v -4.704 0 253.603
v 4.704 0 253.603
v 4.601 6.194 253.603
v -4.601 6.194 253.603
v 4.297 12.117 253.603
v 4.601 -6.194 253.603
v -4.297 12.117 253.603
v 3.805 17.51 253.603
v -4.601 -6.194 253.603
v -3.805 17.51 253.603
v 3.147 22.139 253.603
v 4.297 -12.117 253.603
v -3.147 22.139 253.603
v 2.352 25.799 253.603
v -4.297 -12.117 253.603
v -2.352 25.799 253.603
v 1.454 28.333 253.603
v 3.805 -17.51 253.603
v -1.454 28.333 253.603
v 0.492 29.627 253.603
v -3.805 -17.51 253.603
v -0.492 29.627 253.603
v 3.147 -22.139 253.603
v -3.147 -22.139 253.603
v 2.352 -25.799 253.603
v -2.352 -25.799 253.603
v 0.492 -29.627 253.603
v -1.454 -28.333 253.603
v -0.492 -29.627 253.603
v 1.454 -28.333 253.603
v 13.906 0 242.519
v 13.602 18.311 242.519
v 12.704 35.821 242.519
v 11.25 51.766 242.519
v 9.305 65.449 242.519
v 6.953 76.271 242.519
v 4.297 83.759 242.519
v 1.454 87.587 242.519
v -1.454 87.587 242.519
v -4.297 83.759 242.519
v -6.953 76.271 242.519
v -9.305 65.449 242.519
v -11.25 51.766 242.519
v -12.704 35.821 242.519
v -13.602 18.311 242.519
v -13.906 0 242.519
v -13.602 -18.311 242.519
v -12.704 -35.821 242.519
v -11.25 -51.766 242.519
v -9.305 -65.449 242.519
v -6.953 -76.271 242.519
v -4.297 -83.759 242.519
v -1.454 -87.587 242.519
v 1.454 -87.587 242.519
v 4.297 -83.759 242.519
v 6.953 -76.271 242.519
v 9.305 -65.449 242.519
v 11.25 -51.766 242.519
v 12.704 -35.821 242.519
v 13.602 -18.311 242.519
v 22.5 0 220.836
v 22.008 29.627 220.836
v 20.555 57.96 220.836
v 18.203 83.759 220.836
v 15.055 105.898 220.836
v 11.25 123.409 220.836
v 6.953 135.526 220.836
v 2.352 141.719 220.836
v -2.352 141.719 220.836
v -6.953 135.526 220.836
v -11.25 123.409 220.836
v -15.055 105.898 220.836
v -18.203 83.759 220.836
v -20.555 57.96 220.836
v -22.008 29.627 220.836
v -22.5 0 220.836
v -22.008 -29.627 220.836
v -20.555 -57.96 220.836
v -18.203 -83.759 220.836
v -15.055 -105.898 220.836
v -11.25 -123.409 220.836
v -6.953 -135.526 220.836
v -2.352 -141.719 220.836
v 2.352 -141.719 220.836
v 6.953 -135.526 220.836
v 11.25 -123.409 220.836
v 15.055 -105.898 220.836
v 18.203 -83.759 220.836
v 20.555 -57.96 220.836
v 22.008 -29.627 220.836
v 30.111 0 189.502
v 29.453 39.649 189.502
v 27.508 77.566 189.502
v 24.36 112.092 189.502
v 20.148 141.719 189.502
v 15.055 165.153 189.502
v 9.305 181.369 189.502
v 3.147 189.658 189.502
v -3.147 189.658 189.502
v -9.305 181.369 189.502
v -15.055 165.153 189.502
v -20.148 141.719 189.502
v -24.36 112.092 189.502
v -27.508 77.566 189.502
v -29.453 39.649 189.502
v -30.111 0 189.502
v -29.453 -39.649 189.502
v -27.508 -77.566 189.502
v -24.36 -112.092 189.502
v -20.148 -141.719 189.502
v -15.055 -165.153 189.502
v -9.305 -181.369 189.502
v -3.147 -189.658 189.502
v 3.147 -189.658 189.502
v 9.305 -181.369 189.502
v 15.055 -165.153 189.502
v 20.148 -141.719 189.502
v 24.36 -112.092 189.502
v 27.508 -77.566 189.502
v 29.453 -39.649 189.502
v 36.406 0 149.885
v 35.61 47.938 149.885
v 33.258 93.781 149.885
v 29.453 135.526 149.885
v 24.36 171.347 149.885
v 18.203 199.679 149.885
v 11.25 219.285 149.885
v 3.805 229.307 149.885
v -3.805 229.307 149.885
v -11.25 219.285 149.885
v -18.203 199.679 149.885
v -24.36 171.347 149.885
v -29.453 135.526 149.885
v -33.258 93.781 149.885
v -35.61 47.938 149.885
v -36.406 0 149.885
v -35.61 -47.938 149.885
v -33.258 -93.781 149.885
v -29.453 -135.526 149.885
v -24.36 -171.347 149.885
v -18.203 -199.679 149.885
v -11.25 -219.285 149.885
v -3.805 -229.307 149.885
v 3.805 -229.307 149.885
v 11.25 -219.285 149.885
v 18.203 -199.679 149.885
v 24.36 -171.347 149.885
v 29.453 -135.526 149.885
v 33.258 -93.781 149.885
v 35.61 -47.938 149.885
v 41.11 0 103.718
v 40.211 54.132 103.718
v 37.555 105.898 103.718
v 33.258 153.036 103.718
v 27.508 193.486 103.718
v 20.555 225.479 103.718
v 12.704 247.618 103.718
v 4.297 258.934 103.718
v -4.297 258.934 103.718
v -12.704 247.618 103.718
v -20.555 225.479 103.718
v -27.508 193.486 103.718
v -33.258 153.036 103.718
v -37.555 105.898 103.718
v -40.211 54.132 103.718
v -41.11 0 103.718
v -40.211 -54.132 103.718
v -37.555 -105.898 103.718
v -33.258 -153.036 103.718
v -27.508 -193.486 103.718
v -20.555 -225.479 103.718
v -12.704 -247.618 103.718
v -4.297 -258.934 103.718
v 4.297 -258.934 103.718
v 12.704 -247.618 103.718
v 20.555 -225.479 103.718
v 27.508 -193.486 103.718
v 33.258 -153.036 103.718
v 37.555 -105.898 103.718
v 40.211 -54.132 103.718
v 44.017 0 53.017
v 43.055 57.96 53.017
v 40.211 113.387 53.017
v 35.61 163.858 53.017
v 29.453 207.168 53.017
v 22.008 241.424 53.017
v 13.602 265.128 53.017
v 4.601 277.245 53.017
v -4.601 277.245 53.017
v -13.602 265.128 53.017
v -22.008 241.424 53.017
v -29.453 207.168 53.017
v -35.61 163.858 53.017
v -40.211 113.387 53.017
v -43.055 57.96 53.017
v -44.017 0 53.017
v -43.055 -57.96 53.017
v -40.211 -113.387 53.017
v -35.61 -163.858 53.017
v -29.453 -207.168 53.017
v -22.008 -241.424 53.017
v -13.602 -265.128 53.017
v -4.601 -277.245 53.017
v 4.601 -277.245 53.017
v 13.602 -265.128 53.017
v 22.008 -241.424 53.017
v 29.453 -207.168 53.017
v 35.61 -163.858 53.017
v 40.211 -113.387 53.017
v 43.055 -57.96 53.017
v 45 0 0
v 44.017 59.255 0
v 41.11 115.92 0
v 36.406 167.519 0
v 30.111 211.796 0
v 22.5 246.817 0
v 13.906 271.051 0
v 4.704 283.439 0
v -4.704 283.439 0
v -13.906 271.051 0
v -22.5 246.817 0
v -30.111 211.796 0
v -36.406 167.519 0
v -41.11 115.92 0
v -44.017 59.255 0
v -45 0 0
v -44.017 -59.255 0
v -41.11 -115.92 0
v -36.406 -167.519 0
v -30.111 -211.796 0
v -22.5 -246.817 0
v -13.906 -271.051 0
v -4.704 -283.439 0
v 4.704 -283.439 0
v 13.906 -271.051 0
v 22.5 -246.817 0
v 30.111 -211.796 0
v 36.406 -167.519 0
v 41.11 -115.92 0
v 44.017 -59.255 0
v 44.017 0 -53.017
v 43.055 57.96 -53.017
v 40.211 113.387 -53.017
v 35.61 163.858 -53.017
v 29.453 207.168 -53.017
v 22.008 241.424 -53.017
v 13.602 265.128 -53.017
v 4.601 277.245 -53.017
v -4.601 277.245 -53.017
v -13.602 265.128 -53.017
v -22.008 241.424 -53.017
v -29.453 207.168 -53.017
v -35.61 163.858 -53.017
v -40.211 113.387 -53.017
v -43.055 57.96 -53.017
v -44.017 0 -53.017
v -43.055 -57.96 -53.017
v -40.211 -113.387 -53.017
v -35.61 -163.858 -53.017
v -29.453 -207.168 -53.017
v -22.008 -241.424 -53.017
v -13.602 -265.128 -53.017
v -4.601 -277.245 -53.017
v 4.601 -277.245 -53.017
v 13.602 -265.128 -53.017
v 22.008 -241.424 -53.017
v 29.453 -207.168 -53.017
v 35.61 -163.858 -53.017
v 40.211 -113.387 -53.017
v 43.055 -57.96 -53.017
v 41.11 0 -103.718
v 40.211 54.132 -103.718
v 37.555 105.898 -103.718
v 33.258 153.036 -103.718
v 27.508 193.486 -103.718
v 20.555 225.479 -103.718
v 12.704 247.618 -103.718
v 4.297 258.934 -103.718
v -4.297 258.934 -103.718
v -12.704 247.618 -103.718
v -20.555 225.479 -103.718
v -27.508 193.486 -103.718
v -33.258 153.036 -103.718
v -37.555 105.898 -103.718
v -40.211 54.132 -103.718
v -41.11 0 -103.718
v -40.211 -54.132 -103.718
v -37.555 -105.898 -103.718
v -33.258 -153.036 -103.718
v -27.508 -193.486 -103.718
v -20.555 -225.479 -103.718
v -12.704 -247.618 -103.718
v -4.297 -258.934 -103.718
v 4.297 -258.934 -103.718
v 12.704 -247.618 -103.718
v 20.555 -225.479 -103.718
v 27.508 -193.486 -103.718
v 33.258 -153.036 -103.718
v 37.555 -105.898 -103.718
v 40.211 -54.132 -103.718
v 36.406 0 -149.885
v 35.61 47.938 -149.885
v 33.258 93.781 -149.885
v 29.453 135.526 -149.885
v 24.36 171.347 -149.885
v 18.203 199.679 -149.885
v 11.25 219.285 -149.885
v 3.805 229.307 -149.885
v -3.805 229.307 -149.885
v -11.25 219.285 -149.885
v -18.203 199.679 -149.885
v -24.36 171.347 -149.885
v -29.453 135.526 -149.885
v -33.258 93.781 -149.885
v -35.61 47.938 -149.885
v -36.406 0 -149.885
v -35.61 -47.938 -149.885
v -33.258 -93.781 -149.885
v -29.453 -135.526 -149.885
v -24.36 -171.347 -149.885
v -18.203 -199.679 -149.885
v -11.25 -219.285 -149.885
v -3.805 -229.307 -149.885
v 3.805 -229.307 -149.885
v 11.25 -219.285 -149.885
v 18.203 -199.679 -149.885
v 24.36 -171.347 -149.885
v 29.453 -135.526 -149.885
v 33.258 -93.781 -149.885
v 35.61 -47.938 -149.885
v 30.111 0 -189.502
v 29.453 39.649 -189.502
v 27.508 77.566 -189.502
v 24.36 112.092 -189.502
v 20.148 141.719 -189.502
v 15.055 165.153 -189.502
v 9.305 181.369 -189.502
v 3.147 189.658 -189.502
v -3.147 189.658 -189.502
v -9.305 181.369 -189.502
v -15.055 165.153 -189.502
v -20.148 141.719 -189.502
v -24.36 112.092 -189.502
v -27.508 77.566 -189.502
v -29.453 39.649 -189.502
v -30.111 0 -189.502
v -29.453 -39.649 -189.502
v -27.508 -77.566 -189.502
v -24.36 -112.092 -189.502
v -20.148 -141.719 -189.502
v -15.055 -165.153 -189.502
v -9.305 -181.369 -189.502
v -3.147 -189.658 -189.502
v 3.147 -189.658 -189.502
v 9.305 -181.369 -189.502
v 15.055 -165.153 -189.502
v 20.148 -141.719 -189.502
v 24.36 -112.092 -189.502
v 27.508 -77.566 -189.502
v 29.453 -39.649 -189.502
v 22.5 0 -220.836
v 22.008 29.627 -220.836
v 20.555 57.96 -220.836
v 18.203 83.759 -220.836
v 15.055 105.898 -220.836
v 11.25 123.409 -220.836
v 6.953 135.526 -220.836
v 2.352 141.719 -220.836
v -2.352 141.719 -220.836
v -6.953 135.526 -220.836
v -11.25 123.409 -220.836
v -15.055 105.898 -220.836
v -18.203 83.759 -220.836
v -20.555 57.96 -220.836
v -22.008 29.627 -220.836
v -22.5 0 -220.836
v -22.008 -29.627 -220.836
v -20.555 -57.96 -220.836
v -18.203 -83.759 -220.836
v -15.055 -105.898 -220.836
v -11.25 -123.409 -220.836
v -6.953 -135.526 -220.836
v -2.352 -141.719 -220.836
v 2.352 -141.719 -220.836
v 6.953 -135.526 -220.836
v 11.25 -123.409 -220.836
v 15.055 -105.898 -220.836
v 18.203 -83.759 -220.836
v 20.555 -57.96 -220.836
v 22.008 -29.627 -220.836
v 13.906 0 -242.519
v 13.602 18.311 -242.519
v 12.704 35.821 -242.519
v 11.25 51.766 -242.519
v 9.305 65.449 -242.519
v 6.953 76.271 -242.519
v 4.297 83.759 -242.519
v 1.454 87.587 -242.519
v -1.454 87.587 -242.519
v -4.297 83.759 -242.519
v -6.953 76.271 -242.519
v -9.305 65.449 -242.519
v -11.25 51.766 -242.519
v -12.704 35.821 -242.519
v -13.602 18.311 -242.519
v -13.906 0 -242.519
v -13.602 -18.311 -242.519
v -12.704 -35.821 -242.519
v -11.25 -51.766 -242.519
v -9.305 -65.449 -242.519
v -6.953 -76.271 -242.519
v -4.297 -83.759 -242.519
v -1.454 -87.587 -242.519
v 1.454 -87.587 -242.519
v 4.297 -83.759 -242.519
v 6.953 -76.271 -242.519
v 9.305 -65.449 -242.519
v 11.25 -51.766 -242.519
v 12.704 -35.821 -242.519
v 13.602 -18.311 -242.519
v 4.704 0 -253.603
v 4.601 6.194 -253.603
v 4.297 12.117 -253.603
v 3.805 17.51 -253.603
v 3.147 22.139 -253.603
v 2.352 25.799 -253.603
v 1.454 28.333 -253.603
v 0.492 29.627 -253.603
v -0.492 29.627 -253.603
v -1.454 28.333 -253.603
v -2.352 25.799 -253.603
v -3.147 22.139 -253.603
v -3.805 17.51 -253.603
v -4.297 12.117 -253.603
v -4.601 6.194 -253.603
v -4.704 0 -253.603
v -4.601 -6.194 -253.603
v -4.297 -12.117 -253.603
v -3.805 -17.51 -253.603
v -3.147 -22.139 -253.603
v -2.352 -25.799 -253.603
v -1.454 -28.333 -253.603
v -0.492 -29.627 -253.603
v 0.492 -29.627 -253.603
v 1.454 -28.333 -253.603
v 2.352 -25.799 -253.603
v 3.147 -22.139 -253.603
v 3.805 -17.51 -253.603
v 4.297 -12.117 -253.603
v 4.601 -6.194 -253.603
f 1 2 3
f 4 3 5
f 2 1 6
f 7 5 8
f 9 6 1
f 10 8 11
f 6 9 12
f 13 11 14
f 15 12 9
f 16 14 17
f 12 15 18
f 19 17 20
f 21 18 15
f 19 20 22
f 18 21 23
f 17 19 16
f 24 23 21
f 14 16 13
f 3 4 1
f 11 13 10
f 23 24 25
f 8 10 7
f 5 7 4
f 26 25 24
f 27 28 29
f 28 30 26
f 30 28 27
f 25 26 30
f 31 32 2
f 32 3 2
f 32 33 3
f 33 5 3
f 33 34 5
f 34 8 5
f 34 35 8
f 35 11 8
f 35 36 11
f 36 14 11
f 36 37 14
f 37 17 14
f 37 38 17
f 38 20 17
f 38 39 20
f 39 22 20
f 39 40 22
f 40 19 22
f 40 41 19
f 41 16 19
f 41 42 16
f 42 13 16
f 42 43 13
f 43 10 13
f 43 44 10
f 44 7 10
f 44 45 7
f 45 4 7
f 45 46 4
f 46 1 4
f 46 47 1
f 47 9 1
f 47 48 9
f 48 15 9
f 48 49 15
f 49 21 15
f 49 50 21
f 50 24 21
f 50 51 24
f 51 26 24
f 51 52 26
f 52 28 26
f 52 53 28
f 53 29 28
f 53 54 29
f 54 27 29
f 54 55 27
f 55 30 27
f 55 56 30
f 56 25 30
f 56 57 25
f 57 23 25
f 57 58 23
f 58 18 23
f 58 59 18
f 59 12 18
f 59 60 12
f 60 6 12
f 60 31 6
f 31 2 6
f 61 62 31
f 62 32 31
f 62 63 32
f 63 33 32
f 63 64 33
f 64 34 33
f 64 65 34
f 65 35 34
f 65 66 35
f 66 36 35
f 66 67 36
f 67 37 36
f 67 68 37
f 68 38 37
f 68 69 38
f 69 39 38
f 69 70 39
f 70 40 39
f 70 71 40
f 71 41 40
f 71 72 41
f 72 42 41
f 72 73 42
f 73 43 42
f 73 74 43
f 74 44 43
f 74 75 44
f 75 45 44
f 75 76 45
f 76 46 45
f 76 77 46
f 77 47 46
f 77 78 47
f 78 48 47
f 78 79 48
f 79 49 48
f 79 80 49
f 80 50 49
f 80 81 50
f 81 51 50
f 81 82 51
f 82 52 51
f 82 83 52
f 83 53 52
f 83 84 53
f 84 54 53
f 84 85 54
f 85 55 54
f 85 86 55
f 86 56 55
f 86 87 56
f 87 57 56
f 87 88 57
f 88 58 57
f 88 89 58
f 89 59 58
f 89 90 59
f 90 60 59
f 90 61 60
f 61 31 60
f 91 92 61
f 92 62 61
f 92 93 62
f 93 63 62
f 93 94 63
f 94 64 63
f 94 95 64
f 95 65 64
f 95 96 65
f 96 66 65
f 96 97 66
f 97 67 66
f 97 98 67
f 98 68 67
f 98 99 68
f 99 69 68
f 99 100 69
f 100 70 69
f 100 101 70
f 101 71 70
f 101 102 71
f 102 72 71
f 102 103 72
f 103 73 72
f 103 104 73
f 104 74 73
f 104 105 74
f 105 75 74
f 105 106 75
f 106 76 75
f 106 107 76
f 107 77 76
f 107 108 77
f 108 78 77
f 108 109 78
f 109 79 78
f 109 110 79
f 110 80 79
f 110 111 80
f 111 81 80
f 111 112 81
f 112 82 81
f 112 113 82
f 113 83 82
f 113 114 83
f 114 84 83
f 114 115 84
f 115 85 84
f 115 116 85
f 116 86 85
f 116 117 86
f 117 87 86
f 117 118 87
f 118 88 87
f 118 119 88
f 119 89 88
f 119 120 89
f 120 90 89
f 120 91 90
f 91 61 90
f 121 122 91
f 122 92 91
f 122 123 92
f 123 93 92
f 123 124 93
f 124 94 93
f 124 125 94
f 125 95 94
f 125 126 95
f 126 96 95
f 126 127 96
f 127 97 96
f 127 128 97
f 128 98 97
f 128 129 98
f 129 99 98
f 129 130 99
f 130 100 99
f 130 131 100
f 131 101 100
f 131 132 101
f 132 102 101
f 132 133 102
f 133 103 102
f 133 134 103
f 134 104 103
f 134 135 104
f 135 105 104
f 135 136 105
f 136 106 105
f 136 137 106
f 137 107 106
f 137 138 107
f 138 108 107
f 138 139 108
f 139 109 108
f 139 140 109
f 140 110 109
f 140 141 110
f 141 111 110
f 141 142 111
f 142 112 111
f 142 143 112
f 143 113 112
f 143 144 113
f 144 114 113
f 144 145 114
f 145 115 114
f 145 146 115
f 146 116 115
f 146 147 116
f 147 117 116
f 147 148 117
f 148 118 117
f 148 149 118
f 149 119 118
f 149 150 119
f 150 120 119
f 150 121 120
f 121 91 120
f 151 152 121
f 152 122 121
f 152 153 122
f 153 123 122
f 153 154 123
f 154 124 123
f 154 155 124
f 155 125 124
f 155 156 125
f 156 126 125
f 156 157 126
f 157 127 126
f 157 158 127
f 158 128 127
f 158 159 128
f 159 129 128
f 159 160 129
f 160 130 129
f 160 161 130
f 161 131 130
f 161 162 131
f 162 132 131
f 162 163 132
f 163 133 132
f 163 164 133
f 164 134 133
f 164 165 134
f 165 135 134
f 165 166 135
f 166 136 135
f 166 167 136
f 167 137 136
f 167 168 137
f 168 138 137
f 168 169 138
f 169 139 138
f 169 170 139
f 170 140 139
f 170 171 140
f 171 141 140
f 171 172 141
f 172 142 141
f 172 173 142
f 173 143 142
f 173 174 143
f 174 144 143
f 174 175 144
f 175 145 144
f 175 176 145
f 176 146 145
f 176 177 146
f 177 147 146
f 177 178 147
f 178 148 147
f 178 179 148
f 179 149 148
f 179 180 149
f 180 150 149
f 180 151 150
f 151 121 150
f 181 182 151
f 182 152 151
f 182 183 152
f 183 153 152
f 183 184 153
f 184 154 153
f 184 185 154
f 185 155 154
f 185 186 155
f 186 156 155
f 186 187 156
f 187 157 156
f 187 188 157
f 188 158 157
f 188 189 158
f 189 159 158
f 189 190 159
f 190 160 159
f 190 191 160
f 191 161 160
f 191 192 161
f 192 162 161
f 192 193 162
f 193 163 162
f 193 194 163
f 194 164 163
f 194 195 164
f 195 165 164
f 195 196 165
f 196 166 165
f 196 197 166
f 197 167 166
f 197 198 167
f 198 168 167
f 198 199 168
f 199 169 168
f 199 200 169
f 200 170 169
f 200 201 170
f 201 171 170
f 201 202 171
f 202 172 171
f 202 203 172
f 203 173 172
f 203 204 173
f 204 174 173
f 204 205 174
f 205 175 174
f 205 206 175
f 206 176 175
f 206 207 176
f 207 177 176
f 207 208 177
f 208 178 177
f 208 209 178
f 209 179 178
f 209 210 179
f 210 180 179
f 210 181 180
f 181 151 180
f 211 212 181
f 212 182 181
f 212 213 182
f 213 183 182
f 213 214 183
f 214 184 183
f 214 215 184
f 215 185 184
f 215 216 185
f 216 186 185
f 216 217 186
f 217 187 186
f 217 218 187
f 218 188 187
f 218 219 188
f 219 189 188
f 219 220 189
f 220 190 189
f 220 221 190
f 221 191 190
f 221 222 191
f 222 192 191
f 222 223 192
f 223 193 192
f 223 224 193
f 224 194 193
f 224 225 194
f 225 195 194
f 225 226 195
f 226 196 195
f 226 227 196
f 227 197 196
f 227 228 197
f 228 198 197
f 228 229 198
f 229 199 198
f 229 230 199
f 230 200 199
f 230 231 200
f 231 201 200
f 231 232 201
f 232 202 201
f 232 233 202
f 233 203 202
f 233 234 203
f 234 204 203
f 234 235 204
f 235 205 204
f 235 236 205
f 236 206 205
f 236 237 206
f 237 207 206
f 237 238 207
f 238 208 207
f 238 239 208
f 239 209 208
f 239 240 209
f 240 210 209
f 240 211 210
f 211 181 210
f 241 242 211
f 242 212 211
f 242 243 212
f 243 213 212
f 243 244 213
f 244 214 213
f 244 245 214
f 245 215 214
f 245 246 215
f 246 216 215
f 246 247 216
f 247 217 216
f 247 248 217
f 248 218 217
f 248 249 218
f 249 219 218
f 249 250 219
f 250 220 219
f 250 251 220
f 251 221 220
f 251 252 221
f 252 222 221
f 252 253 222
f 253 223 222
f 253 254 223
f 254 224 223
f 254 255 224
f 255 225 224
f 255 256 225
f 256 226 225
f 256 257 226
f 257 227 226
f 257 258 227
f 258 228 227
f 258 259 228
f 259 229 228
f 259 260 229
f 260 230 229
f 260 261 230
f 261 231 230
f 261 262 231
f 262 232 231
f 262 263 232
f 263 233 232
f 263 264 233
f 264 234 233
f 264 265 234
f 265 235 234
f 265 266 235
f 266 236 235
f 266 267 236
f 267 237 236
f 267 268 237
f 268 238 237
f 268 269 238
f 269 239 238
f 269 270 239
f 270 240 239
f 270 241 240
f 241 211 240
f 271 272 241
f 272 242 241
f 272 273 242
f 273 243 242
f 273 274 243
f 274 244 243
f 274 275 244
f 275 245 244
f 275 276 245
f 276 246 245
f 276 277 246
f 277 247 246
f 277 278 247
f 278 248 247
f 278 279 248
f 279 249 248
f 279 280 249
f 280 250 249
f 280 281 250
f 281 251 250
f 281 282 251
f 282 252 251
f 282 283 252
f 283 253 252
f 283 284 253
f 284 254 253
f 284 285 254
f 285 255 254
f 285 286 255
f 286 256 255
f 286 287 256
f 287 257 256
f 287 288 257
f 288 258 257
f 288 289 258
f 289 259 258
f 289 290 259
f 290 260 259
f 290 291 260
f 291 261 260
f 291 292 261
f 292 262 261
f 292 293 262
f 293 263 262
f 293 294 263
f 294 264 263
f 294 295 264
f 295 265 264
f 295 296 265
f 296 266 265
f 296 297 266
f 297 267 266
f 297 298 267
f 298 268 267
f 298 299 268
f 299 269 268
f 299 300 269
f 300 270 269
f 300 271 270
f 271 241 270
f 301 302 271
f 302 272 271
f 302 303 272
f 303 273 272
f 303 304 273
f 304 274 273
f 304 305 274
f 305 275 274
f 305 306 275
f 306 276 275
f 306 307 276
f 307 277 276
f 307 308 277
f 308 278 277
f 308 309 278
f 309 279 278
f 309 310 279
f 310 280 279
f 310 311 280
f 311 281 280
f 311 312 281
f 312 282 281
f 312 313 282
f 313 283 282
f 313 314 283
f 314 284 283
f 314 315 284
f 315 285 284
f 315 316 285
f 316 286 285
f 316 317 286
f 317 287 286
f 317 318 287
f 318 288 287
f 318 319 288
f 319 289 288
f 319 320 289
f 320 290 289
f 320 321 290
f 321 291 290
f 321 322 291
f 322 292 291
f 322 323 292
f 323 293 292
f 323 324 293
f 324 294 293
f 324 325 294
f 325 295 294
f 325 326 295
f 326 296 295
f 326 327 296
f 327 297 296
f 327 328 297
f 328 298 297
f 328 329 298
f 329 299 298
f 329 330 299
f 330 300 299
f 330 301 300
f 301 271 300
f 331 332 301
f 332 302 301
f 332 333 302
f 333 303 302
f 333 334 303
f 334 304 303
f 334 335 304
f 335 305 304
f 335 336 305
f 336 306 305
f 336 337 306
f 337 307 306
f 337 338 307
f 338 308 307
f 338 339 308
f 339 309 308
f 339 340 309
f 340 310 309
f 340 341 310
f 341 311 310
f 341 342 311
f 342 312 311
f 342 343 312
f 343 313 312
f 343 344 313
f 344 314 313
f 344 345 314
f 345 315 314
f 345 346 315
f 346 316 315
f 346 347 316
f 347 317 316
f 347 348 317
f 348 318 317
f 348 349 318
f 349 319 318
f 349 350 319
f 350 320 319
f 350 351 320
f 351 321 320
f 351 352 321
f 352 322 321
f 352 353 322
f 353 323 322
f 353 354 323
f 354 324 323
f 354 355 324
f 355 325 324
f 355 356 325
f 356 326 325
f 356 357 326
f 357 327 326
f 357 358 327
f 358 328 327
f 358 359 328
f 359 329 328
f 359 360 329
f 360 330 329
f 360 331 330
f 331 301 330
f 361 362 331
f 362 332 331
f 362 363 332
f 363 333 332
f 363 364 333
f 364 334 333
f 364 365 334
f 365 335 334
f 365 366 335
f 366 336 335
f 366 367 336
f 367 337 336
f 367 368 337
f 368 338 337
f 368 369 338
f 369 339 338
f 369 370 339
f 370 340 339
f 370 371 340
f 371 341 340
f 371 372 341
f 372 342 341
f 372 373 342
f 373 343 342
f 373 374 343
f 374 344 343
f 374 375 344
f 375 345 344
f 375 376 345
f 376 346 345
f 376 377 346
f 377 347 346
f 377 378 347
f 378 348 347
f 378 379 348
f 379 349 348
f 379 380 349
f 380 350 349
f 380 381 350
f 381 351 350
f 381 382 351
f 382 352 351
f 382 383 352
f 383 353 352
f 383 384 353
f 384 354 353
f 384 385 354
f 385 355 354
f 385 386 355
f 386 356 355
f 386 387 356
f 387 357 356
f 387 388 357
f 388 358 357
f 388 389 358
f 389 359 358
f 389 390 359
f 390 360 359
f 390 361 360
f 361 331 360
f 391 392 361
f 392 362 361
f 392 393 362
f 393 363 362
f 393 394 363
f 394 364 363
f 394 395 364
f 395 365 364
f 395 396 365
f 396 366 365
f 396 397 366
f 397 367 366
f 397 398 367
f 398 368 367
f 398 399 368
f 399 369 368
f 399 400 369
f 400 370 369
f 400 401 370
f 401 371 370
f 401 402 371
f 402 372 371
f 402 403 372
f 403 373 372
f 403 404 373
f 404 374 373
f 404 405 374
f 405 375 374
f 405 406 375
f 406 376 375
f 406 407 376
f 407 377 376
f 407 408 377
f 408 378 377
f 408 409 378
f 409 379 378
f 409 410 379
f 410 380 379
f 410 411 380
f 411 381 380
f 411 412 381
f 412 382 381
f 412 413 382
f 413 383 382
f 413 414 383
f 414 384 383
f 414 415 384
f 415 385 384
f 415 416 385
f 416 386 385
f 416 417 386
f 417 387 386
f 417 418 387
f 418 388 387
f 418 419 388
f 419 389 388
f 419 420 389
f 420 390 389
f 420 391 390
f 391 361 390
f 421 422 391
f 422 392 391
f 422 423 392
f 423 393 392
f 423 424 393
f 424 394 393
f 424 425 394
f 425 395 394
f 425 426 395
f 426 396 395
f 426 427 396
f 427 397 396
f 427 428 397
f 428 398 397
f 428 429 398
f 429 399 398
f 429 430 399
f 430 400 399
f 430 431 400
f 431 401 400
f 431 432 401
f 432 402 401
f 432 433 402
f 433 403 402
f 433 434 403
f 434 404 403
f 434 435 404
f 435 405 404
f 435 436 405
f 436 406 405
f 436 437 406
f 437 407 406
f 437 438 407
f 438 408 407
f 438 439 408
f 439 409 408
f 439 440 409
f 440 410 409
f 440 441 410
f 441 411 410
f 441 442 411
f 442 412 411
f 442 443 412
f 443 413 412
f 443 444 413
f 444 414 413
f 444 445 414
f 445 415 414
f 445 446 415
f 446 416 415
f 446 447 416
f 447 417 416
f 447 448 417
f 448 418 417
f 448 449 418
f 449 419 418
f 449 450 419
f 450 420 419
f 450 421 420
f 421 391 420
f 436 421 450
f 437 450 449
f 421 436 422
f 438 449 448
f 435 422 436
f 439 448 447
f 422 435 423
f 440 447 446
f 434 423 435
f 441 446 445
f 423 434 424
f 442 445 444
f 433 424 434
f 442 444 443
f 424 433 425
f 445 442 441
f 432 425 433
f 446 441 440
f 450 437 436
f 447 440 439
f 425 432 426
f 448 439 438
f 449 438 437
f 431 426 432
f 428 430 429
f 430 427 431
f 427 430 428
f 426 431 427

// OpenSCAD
// Generated by SolidPython 1.0.1 on 2020-07-29 00:46:46


scale(v = [3, 19, 17]) {
	sphere(r = 15);
}
/***********************************************
*********      SolidPython code:      **********
************************************************
 
# import packages: SolidPython
from solid import *
from solid.utils import *
from itertools import chain, combinations, permutations


class Resize:

    def __init__(self, scad_file):
        self.scad_file = scad_file
        #self.scad_file = import_scad(scad_file)
        # cone/cylinder param:
        self.r1 = 0
        self.r2 = 0
        self.h = 0
        # rectangular prism param:
        self.w = 0
        self.l = 0
        # ellipse param:
        self.r = 0

    # import OpenScad code (file name corresponds to shape)


    # classify shape + parameters
    def assign(self, param1, param2, param3):
        if self.scad_file == 'cone.scad':
            self.r1 = param1
            self.r2 = param2
            self.h = param3
        elif self.scad_file == 'cylinder.scad':
            self.r1 = param1
            self.r2 = param2
            self.h = param3
        elif self.scad_file == 'rectangularPrism.scad':
            self.h = param1
            self.l = param2
            self.w = param3
        else:
            self.r = param1
            self.h = param2

    # resize parameters
    def iterate(self):
        x = range(3, 20, 2)
        i = 1
        if self.scad_file == 'cone.scad':
            tempList = list(permutations(x, 2))
            for temp in tempList:
                param1 = temp[0]
                param2 = temp[1]
                filepath = 'produced_scad_files/' + 'cone' + str(param1) + '_' + str(param2) + '_' + '.scad'
                scad_render_to_file(cylinder(h=param1, r1=param2, r2=0), filepath)

        elif self.scad_file == 'cylinder.scad':
            tempList = list(permutations(x, 3))
            for temp in tempList:
                param1 = temp[0]
                param2 = temp[1]
                filepath = 'produced_scad_files/' + 'cylinder' + str(param1) + '_' + str(param2) + '_' + '.scad'
                scad_render_to_file(cylinder(h=param1, r1=param2, r2=param2), filepath)

        elif self.scad_file == 'rectangularPrism.scad':
            tempList = list(permutations(x, 3))
            for temp in tempList:
                param1 = temp[0]
                param2 = temp[1]
                param3 = temp[2]
                filepath = 'produced_scad_files/' + 'rectangularPrism' + str(param1) + '_' + str(param2) + '_' + str(
                    param3) + '.scad'
                scad_render_to_file(cube(size=(param1, param2, param3)), filepath)

        elif self.scad_file == 'ellipse.scad':
            tempList = list(permutations(x, 4))
            for temp in tempList:
                param1 = temp[0]
                param2 = temp[1]
                param3 = temp[2]
                param4 = temp[3]
                filepath = 'produced_scad_files/' + 'ellipse' + str(param1) + '_' + str(param2) + '_' + str(param3) + '_' + str(param4) + '.scad'
                scad_render_to_file(scale([param1, param2, param3])(sphere(r=param4)), filepath)

    def render_to_scadfile(self):
        scad_render_to_file(scad, 'example.scad') 
 
************************************************/
